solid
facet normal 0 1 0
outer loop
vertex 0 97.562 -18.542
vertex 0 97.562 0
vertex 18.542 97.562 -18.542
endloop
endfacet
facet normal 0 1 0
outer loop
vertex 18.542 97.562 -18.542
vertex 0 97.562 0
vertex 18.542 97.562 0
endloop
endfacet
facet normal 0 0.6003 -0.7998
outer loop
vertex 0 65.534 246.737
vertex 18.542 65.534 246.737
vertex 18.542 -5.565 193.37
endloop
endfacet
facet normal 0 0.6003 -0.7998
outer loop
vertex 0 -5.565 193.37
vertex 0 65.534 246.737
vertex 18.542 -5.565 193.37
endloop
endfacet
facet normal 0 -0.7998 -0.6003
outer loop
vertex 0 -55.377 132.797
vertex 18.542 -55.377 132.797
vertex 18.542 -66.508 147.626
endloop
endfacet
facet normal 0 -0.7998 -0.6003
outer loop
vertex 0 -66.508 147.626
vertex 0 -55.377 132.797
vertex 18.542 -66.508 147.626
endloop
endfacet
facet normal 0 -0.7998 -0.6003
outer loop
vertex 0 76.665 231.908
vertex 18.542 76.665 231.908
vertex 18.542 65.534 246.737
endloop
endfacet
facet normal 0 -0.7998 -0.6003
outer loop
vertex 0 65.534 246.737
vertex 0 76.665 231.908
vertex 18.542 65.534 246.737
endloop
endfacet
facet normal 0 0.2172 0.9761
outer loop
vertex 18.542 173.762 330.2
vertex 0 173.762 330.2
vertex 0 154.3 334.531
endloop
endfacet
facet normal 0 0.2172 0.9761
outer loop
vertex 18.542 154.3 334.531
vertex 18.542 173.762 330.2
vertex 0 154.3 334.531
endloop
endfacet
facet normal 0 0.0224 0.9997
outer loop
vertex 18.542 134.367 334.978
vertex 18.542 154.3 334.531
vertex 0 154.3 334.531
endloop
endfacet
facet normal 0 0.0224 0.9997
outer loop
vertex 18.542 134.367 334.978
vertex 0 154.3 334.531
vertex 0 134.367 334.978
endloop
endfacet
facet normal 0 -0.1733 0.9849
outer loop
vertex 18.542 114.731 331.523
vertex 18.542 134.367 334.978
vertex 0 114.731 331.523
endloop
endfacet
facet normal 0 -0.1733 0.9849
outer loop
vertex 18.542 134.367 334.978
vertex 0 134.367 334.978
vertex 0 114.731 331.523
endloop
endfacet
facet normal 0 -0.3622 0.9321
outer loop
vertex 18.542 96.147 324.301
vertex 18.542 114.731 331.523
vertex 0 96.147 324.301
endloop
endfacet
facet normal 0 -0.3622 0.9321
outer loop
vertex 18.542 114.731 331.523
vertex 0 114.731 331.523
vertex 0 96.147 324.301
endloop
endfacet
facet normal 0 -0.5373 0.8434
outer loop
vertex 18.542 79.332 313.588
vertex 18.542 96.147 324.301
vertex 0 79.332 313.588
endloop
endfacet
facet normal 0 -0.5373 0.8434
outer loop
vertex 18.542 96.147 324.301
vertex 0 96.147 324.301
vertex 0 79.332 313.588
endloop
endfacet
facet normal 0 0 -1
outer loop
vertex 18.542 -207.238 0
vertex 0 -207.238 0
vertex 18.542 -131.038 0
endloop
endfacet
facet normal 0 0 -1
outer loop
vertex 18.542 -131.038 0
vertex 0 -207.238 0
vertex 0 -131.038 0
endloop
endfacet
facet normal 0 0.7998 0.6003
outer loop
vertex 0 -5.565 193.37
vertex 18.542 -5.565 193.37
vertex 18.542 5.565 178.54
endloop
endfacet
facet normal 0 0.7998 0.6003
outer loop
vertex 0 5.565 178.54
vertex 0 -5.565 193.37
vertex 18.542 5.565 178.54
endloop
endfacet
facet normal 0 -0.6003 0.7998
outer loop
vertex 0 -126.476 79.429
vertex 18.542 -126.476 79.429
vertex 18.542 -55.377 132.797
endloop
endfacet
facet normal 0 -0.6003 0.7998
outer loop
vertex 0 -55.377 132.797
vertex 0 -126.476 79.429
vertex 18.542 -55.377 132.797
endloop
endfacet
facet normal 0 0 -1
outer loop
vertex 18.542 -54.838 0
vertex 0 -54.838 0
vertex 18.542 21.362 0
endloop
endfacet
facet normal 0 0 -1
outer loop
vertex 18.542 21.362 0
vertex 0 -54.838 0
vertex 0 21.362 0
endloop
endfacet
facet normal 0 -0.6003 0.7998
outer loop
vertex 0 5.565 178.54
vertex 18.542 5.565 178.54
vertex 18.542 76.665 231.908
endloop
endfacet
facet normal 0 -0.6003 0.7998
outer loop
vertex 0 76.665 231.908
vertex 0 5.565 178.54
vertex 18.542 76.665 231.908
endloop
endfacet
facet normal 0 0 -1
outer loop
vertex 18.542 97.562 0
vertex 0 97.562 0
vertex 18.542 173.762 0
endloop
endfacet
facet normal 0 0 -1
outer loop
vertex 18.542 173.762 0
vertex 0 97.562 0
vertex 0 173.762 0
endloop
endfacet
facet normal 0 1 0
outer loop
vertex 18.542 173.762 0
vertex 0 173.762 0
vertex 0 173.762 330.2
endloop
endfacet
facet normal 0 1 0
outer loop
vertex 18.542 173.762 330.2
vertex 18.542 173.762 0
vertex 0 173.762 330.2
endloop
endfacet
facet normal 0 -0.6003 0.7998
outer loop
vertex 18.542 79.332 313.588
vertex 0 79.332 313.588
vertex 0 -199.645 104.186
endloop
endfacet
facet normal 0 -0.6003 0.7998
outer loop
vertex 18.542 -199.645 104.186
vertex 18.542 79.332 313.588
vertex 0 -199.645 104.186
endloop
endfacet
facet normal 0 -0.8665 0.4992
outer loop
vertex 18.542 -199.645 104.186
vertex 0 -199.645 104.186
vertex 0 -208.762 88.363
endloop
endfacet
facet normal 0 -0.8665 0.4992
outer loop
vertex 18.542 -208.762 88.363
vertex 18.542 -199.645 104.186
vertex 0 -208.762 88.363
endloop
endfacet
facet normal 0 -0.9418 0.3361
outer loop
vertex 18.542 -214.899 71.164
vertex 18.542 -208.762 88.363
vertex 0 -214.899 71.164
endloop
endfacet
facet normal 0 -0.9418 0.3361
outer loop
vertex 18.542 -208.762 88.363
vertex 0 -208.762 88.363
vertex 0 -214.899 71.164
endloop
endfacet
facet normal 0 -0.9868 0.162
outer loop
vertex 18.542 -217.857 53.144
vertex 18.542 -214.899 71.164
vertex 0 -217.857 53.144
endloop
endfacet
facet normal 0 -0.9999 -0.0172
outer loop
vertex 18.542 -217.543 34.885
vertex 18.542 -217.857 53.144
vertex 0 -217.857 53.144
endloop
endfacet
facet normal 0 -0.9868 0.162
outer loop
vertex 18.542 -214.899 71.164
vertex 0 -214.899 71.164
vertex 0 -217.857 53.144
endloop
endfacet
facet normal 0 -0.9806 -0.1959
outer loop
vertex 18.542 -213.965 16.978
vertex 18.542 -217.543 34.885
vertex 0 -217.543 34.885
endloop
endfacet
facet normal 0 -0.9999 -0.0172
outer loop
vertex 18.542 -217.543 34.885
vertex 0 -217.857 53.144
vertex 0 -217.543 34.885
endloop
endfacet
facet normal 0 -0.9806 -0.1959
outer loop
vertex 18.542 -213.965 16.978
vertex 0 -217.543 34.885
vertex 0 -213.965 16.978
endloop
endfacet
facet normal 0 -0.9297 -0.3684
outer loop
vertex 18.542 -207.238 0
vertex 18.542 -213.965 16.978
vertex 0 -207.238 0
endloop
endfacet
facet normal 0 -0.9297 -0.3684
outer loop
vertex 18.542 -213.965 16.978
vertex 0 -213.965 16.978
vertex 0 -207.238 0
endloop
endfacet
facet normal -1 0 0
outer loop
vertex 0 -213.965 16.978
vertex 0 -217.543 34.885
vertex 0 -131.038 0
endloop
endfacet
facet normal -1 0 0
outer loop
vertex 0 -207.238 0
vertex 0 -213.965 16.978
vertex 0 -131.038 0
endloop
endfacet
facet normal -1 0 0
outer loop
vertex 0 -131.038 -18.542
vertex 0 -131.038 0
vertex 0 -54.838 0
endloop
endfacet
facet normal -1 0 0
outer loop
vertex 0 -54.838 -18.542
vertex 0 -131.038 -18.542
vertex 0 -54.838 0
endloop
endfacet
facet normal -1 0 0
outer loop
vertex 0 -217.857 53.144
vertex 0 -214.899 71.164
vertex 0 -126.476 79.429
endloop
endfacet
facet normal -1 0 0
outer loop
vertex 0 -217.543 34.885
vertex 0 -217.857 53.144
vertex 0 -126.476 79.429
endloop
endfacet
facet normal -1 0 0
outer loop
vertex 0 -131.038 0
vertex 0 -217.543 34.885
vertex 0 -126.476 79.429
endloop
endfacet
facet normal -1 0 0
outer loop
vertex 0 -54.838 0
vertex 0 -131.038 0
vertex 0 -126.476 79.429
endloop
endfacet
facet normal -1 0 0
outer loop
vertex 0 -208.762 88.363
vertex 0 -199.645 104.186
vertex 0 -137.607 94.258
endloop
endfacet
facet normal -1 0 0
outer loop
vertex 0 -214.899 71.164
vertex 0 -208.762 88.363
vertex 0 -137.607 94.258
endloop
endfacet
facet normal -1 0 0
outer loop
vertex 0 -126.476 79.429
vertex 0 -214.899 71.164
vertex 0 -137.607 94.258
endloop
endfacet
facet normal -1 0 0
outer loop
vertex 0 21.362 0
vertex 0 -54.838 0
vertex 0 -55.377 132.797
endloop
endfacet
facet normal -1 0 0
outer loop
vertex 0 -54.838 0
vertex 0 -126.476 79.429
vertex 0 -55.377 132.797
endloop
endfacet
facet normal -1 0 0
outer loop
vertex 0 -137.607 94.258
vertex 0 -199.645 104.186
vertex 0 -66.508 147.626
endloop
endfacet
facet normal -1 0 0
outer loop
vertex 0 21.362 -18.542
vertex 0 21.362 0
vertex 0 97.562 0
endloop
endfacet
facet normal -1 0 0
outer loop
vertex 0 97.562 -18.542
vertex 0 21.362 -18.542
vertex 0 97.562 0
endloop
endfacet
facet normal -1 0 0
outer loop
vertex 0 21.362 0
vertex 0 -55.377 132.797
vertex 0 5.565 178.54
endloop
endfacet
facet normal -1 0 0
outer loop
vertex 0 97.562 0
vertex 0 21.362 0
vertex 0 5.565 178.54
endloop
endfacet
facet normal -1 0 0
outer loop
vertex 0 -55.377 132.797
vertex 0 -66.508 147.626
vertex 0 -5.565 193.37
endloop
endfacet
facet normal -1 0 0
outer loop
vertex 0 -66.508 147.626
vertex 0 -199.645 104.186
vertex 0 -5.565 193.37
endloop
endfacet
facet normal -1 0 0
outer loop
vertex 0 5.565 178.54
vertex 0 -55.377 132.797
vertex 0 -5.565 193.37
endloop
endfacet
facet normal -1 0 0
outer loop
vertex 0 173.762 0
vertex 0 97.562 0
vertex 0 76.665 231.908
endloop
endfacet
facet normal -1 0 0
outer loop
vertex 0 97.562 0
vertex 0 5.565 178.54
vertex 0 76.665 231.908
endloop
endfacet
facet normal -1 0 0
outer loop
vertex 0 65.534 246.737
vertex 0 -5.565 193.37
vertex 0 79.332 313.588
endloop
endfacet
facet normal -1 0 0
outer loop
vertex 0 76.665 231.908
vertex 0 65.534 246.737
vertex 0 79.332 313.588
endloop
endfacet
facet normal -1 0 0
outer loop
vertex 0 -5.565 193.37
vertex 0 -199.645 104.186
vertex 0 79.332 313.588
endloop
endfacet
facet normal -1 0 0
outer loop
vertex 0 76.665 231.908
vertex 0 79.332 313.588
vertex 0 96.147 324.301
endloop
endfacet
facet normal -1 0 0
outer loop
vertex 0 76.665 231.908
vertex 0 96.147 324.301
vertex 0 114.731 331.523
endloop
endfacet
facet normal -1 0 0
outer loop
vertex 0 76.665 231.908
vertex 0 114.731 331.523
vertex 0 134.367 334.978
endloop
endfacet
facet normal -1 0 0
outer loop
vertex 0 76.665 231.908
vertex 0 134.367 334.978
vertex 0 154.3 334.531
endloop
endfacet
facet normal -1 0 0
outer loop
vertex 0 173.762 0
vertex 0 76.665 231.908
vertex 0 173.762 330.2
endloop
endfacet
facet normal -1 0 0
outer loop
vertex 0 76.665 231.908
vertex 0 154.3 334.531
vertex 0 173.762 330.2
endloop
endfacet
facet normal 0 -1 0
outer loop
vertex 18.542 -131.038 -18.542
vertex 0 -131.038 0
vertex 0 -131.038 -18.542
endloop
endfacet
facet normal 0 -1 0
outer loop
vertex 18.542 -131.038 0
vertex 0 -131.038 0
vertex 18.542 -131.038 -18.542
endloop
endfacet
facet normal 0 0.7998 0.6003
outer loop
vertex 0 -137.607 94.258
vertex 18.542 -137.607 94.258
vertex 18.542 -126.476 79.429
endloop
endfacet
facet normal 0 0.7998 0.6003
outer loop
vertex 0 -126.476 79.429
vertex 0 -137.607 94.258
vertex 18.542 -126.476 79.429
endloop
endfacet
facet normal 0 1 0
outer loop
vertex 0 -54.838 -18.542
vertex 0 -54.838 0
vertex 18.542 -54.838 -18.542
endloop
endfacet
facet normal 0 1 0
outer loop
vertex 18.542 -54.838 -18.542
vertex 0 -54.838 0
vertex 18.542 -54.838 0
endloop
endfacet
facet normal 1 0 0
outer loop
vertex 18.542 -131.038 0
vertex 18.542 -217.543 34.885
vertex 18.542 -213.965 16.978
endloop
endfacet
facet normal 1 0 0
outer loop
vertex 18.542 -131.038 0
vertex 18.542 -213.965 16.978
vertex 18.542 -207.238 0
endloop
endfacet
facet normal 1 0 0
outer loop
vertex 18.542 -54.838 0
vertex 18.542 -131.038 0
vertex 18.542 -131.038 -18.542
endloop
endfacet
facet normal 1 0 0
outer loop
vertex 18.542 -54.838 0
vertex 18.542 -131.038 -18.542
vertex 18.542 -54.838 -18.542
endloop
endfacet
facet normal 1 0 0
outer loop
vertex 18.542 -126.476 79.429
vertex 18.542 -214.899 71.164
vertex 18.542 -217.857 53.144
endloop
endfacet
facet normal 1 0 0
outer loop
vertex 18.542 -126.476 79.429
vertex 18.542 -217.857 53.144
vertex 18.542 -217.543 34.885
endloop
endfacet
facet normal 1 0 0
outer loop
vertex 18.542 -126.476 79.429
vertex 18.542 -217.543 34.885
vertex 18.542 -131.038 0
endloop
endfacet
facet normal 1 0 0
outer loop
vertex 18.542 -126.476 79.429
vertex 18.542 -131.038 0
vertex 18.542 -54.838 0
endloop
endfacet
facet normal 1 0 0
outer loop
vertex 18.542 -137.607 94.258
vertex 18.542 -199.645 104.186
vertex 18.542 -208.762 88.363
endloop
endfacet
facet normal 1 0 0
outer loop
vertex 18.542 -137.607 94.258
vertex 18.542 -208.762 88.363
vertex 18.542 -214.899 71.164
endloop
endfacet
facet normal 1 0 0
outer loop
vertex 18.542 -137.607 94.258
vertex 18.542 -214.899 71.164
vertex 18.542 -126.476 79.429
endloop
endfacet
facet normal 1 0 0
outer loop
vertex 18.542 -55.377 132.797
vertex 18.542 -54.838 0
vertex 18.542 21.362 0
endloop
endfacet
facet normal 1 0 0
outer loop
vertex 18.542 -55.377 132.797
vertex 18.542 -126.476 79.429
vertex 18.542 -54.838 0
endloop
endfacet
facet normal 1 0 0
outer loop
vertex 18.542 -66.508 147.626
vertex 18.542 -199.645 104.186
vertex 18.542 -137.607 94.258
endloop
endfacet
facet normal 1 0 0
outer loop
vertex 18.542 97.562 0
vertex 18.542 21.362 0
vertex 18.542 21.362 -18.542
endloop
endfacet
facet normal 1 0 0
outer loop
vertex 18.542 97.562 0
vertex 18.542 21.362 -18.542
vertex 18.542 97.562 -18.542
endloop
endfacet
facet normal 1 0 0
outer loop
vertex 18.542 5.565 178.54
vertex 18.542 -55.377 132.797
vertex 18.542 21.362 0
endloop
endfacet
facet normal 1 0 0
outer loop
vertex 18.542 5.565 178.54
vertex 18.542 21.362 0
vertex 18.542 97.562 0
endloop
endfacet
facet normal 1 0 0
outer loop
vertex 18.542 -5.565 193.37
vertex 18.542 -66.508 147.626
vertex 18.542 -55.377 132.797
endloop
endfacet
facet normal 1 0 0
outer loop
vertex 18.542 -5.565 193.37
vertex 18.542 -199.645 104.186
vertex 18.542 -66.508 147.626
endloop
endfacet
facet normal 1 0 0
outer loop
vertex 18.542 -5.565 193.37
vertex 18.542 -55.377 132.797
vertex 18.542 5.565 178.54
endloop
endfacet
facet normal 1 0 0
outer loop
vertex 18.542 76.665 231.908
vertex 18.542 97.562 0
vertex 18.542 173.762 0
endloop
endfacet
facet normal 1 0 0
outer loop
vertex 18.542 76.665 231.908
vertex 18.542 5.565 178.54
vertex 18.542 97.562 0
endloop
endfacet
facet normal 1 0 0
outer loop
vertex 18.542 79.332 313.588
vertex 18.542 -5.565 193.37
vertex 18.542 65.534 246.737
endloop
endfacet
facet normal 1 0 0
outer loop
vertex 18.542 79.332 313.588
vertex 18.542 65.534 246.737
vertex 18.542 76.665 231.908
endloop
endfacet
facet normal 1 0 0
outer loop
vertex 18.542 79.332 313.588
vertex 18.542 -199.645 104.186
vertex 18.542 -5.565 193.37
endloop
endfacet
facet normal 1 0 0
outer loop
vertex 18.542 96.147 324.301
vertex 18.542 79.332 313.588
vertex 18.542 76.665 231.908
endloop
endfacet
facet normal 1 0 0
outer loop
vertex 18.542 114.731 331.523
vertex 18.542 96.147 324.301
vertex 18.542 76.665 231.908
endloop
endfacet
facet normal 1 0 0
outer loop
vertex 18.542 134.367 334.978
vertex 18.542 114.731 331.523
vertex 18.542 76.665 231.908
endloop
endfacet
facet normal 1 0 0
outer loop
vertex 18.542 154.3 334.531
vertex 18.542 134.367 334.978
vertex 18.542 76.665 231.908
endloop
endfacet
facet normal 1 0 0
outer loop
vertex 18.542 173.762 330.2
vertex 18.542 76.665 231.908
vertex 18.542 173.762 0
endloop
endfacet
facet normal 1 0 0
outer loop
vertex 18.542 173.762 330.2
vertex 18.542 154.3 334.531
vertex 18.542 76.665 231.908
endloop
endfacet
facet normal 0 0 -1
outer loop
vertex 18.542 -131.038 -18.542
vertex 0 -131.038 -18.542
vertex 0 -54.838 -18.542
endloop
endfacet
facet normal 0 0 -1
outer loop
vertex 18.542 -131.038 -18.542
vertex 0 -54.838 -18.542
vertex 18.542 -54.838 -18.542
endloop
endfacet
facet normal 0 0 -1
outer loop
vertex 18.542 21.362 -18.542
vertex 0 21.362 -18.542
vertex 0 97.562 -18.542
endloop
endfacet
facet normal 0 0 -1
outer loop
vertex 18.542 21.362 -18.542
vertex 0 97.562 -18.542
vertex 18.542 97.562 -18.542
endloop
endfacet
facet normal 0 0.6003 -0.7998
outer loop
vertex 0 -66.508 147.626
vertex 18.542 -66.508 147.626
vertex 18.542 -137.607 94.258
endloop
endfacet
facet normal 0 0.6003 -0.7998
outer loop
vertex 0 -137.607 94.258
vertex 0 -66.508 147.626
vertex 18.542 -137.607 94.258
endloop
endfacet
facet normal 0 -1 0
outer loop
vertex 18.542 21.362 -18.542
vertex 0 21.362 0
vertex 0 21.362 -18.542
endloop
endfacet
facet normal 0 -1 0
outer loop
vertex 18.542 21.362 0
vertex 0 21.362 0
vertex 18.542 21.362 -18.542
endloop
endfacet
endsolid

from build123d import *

# Parameters (mm, degrees)
F1_DEPTH = 18.542
F2_W     = 18.542
F2_H     = 76.2
F3_DEPTH = 18.542
F5_DEPTH = 25.4


with BuildPart() as f1:
    # F0 (on Right) → F1 (new body)
    with BuildSketch(Plane.YZ):
        with BuildLine():
            ThreePointArc((-199.645225, 104.186206), (-217.85746, 53.143737), (-207.238496, 0))
            Line((-207.238496, 0), (173.761504, 0))
            Line((173.761504, 0), (173.761504, 330.2))
            ThreePointArc((173.761504, 330.2), (124.464127, 333.733445), (79.332339, 313.588016))
            Line((79.332339, 313.588016), (-199.645225, 104.186206))
        make_face()
    extrude(amount=F1_DEPTH)

    # F2 (on face) → F3 (join)
    with BuildSketch(Plane(origin=(0, 0, 0), x_dir=(1, 0, 0), z_dir=(0, 0, -1))):
        with Locations((9.271, -59.461504)):
            Rectangle(F2_W, F2_H)
        with Locations((9.271, 92.938496)):
            Rectangle(F2_W, F2_H)
    extrude(amount=F3_DEPTH)

    # F4 (on face) → F5 (cut)
    with BuildSketch(Plane.YZ.offset(18.542)):
        Polygon((-5.565468, 193.369503), (5.565468, 178.540207), (76.664833, 231.907709), (65.533897, 246.737005), align=None)
        Polygon((-66.507781, 147.62593), (-137.607146, 94.258428), (-126.47621, 79.429131), (-55.376845, 132.796634), align=None)
    extrude(amount=-F5_DEPTH, mode=Mode.SUBTRACT)


solid = f1.part
